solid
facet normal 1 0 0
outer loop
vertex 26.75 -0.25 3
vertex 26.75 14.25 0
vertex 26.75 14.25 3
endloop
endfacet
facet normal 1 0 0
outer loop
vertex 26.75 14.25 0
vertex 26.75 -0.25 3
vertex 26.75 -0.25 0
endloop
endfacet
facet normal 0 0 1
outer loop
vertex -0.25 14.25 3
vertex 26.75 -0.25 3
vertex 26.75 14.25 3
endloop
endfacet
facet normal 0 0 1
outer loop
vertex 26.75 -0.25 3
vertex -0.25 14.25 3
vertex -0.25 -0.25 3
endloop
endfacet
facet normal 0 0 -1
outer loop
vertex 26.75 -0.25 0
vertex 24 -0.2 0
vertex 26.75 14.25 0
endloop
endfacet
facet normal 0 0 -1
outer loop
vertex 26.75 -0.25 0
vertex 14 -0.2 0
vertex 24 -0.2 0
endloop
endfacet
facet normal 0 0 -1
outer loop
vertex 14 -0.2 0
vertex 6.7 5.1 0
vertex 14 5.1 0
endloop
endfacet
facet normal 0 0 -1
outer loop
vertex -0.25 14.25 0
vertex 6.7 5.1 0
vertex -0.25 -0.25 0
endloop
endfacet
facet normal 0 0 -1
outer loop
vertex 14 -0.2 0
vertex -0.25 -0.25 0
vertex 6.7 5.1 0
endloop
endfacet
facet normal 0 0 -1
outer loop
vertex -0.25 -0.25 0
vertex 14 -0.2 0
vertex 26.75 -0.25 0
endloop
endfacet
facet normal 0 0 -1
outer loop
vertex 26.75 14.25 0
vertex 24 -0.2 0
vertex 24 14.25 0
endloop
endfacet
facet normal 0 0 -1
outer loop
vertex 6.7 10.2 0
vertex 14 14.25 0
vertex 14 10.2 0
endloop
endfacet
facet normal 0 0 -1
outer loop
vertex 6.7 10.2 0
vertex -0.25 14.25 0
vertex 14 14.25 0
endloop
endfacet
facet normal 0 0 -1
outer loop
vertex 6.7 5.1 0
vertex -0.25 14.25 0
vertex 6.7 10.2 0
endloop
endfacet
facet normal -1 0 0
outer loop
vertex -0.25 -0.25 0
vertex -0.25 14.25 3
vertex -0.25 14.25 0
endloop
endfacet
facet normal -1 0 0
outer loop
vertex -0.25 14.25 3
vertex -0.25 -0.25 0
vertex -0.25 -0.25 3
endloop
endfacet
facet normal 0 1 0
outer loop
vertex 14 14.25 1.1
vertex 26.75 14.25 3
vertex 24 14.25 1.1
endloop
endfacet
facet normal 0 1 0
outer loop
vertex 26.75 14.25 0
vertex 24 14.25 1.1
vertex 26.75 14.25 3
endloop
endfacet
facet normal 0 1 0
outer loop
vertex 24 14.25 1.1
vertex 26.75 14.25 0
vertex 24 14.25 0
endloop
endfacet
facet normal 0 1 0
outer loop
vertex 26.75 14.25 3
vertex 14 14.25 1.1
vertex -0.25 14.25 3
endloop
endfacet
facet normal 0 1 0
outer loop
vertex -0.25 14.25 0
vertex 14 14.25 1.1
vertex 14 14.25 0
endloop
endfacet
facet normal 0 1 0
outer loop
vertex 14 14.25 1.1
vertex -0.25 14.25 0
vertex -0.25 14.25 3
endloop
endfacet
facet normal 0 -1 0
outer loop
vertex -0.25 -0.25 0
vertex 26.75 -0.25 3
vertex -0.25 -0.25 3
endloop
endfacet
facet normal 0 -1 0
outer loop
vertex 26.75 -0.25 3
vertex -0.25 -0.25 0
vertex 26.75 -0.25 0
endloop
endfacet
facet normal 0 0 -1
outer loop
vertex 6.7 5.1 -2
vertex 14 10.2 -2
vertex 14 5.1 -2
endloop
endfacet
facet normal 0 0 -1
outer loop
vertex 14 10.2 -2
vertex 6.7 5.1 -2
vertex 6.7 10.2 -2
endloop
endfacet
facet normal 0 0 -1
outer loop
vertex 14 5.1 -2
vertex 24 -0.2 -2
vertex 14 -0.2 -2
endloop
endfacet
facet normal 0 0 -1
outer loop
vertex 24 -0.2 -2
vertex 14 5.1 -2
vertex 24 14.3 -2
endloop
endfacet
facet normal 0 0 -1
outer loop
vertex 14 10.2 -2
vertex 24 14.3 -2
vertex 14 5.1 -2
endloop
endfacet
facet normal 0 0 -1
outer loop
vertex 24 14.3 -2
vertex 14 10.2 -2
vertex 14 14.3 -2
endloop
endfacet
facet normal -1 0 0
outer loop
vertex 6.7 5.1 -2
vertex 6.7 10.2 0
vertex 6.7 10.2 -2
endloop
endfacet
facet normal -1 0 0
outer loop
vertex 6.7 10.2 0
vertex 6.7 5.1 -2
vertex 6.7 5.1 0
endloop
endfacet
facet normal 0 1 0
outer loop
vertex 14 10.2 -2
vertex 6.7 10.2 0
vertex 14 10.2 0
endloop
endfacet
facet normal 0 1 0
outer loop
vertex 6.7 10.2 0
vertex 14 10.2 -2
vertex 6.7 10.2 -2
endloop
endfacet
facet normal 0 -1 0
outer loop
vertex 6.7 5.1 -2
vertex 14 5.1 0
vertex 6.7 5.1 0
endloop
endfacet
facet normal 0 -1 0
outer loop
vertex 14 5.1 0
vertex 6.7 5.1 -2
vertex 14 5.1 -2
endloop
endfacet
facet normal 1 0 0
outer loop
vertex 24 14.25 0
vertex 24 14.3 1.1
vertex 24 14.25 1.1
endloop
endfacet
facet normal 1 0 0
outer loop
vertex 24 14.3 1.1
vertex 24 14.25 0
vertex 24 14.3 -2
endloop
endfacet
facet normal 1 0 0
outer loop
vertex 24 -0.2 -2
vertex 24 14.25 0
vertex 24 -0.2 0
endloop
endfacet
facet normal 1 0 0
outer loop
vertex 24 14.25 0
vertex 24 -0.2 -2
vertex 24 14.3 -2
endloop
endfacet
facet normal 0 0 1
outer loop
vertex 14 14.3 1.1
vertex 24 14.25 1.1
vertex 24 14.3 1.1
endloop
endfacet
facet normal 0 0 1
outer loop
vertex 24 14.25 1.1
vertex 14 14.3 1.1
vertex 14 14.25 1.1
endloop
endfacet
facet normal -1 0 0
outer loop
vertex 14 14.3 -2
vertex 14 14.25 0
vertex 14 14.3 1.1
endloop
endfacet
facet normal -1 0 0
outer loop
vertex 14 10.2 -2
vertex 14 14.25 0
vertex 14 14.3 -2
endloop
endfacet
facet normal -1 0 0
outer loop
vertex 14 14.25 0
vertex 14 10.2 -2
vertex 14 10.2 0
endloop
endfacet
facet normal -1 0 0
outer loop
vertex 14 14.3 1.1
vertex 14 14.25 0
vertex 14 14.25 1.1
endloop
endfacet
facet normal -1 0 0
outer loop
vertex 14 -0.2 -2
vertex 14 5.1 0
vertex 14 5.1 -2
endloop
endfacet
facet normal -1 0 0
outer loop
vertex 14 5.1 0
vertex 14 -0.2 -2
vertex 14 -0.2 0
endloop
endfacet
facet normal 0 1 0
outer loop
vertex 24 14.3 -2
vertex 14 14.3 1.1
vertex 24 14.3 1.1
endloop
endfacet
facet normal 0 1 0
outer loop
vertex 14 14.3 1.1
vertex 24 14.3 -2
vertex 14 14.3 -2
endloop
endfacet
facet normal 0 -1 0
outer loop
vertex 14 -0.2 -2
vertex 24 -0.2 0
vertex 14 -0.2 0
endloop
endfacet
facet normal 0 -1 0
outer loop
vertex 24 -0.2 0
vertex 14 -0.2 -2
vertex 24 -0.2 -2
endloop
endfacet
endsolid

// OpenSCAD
/**
 * Martin Egli
 * 2025-11-24
 * parts for crude lidar
 */

module nema17_m3_cut(h1 = 10, loc_res = 32) {
    for(n = [0:1:3])
    translate([22*cos(45+n*90), 22*sin(45+n*90), 0])
    cylinder(d = 3, h = h1, $fn = loc_res);
}

module nema17_top_cut(h1 = 10, loc_res = 32) {
    translate([0, 0, 0])
    nema17_m3_cut(h1 = h1, loc_res = loc_res);
    translate([0, 0, 0])
    cylinder(d = 22.5, h = h1, $fn = loc_res);
}

module nema17(loc_res = 32) {
    difference() {
        union() {
            // bottom
            color("LightGray")
            translate([0, 0, 0])
            hull() {
                translate([-42/2, -34/2, 0])
                cube([42, 34, 11]);
                translate([-34/2, -42/2, 0])
                cube([34, 42, 11]);
            }
            // connector
            color("LightGray")
            translate([-17/2, -42/2-6, 0])
            cube([17, 6+1, 11]);
            // middle
            color("Black")
            translate([0, 0, 11])
            hull() {
                translate([-42/2, -34/2, 0])
                cube([42, 34, 11]);
                translate([-34/2, -42/2, 0])
                cube([34, 42, 11]);
            }
            // top
            color("LightGray")
            translate([0, 0, 22])
            hull() {
                translate([-42/2, -34/2, 0])
                cube([42, 34, 11]);
                translate([-34/2, -42/2, 0])
                cube([34, 42, 11]);
            }
            // 22 mm on top
            color("LightGray")
            translate([0, 0, 33])
            cylinder(d = 22, h = 2, $fn = loc_res);
            // 5mm spindle
            color("LightGray")
            translate([0, 0, 1])
            cylinder(d = 5, h = 56, $fn = loc_res);
        }
        translate([0, 0, 25])
        nema17_m3_cut();
    }
}
//nema17();

module pcb_vl53l1x_satel(loc_res = 32) {
    // pcb
    color("Green")
    translate([0, 0, 0])
    cube([26.5, 14, 1.5]);
    // sensor
    color("DarkGray")
    translate([19.8, 5.1, 1.5])
    cube([2.2, 3.8, 1.5]);
    // voltage translator
    color("DarkGray")
    translate([6.9, 5.3, -1.5])
    cube([7.1, 4.6, 1.5]);
}
//pcb_vl53l1x_satel();

module pcb_vl53l1x_satel_cut_bottom(loc_res = 32) {
    // space pcb
    translate([-0.25, -0.25, 0])
    cube([27, 14.5, 3]);
    // space voltage translator
    translate([6.9-0.2, 5.3-0.2, -2])
    cube([7.5, 5.1, 3.1]);
    // space components
    translate([14, -0.2, -2])
    cube([10, 14.5, 3.1]);
}
pcb_vl53l1x_satel_cut_bottom();
